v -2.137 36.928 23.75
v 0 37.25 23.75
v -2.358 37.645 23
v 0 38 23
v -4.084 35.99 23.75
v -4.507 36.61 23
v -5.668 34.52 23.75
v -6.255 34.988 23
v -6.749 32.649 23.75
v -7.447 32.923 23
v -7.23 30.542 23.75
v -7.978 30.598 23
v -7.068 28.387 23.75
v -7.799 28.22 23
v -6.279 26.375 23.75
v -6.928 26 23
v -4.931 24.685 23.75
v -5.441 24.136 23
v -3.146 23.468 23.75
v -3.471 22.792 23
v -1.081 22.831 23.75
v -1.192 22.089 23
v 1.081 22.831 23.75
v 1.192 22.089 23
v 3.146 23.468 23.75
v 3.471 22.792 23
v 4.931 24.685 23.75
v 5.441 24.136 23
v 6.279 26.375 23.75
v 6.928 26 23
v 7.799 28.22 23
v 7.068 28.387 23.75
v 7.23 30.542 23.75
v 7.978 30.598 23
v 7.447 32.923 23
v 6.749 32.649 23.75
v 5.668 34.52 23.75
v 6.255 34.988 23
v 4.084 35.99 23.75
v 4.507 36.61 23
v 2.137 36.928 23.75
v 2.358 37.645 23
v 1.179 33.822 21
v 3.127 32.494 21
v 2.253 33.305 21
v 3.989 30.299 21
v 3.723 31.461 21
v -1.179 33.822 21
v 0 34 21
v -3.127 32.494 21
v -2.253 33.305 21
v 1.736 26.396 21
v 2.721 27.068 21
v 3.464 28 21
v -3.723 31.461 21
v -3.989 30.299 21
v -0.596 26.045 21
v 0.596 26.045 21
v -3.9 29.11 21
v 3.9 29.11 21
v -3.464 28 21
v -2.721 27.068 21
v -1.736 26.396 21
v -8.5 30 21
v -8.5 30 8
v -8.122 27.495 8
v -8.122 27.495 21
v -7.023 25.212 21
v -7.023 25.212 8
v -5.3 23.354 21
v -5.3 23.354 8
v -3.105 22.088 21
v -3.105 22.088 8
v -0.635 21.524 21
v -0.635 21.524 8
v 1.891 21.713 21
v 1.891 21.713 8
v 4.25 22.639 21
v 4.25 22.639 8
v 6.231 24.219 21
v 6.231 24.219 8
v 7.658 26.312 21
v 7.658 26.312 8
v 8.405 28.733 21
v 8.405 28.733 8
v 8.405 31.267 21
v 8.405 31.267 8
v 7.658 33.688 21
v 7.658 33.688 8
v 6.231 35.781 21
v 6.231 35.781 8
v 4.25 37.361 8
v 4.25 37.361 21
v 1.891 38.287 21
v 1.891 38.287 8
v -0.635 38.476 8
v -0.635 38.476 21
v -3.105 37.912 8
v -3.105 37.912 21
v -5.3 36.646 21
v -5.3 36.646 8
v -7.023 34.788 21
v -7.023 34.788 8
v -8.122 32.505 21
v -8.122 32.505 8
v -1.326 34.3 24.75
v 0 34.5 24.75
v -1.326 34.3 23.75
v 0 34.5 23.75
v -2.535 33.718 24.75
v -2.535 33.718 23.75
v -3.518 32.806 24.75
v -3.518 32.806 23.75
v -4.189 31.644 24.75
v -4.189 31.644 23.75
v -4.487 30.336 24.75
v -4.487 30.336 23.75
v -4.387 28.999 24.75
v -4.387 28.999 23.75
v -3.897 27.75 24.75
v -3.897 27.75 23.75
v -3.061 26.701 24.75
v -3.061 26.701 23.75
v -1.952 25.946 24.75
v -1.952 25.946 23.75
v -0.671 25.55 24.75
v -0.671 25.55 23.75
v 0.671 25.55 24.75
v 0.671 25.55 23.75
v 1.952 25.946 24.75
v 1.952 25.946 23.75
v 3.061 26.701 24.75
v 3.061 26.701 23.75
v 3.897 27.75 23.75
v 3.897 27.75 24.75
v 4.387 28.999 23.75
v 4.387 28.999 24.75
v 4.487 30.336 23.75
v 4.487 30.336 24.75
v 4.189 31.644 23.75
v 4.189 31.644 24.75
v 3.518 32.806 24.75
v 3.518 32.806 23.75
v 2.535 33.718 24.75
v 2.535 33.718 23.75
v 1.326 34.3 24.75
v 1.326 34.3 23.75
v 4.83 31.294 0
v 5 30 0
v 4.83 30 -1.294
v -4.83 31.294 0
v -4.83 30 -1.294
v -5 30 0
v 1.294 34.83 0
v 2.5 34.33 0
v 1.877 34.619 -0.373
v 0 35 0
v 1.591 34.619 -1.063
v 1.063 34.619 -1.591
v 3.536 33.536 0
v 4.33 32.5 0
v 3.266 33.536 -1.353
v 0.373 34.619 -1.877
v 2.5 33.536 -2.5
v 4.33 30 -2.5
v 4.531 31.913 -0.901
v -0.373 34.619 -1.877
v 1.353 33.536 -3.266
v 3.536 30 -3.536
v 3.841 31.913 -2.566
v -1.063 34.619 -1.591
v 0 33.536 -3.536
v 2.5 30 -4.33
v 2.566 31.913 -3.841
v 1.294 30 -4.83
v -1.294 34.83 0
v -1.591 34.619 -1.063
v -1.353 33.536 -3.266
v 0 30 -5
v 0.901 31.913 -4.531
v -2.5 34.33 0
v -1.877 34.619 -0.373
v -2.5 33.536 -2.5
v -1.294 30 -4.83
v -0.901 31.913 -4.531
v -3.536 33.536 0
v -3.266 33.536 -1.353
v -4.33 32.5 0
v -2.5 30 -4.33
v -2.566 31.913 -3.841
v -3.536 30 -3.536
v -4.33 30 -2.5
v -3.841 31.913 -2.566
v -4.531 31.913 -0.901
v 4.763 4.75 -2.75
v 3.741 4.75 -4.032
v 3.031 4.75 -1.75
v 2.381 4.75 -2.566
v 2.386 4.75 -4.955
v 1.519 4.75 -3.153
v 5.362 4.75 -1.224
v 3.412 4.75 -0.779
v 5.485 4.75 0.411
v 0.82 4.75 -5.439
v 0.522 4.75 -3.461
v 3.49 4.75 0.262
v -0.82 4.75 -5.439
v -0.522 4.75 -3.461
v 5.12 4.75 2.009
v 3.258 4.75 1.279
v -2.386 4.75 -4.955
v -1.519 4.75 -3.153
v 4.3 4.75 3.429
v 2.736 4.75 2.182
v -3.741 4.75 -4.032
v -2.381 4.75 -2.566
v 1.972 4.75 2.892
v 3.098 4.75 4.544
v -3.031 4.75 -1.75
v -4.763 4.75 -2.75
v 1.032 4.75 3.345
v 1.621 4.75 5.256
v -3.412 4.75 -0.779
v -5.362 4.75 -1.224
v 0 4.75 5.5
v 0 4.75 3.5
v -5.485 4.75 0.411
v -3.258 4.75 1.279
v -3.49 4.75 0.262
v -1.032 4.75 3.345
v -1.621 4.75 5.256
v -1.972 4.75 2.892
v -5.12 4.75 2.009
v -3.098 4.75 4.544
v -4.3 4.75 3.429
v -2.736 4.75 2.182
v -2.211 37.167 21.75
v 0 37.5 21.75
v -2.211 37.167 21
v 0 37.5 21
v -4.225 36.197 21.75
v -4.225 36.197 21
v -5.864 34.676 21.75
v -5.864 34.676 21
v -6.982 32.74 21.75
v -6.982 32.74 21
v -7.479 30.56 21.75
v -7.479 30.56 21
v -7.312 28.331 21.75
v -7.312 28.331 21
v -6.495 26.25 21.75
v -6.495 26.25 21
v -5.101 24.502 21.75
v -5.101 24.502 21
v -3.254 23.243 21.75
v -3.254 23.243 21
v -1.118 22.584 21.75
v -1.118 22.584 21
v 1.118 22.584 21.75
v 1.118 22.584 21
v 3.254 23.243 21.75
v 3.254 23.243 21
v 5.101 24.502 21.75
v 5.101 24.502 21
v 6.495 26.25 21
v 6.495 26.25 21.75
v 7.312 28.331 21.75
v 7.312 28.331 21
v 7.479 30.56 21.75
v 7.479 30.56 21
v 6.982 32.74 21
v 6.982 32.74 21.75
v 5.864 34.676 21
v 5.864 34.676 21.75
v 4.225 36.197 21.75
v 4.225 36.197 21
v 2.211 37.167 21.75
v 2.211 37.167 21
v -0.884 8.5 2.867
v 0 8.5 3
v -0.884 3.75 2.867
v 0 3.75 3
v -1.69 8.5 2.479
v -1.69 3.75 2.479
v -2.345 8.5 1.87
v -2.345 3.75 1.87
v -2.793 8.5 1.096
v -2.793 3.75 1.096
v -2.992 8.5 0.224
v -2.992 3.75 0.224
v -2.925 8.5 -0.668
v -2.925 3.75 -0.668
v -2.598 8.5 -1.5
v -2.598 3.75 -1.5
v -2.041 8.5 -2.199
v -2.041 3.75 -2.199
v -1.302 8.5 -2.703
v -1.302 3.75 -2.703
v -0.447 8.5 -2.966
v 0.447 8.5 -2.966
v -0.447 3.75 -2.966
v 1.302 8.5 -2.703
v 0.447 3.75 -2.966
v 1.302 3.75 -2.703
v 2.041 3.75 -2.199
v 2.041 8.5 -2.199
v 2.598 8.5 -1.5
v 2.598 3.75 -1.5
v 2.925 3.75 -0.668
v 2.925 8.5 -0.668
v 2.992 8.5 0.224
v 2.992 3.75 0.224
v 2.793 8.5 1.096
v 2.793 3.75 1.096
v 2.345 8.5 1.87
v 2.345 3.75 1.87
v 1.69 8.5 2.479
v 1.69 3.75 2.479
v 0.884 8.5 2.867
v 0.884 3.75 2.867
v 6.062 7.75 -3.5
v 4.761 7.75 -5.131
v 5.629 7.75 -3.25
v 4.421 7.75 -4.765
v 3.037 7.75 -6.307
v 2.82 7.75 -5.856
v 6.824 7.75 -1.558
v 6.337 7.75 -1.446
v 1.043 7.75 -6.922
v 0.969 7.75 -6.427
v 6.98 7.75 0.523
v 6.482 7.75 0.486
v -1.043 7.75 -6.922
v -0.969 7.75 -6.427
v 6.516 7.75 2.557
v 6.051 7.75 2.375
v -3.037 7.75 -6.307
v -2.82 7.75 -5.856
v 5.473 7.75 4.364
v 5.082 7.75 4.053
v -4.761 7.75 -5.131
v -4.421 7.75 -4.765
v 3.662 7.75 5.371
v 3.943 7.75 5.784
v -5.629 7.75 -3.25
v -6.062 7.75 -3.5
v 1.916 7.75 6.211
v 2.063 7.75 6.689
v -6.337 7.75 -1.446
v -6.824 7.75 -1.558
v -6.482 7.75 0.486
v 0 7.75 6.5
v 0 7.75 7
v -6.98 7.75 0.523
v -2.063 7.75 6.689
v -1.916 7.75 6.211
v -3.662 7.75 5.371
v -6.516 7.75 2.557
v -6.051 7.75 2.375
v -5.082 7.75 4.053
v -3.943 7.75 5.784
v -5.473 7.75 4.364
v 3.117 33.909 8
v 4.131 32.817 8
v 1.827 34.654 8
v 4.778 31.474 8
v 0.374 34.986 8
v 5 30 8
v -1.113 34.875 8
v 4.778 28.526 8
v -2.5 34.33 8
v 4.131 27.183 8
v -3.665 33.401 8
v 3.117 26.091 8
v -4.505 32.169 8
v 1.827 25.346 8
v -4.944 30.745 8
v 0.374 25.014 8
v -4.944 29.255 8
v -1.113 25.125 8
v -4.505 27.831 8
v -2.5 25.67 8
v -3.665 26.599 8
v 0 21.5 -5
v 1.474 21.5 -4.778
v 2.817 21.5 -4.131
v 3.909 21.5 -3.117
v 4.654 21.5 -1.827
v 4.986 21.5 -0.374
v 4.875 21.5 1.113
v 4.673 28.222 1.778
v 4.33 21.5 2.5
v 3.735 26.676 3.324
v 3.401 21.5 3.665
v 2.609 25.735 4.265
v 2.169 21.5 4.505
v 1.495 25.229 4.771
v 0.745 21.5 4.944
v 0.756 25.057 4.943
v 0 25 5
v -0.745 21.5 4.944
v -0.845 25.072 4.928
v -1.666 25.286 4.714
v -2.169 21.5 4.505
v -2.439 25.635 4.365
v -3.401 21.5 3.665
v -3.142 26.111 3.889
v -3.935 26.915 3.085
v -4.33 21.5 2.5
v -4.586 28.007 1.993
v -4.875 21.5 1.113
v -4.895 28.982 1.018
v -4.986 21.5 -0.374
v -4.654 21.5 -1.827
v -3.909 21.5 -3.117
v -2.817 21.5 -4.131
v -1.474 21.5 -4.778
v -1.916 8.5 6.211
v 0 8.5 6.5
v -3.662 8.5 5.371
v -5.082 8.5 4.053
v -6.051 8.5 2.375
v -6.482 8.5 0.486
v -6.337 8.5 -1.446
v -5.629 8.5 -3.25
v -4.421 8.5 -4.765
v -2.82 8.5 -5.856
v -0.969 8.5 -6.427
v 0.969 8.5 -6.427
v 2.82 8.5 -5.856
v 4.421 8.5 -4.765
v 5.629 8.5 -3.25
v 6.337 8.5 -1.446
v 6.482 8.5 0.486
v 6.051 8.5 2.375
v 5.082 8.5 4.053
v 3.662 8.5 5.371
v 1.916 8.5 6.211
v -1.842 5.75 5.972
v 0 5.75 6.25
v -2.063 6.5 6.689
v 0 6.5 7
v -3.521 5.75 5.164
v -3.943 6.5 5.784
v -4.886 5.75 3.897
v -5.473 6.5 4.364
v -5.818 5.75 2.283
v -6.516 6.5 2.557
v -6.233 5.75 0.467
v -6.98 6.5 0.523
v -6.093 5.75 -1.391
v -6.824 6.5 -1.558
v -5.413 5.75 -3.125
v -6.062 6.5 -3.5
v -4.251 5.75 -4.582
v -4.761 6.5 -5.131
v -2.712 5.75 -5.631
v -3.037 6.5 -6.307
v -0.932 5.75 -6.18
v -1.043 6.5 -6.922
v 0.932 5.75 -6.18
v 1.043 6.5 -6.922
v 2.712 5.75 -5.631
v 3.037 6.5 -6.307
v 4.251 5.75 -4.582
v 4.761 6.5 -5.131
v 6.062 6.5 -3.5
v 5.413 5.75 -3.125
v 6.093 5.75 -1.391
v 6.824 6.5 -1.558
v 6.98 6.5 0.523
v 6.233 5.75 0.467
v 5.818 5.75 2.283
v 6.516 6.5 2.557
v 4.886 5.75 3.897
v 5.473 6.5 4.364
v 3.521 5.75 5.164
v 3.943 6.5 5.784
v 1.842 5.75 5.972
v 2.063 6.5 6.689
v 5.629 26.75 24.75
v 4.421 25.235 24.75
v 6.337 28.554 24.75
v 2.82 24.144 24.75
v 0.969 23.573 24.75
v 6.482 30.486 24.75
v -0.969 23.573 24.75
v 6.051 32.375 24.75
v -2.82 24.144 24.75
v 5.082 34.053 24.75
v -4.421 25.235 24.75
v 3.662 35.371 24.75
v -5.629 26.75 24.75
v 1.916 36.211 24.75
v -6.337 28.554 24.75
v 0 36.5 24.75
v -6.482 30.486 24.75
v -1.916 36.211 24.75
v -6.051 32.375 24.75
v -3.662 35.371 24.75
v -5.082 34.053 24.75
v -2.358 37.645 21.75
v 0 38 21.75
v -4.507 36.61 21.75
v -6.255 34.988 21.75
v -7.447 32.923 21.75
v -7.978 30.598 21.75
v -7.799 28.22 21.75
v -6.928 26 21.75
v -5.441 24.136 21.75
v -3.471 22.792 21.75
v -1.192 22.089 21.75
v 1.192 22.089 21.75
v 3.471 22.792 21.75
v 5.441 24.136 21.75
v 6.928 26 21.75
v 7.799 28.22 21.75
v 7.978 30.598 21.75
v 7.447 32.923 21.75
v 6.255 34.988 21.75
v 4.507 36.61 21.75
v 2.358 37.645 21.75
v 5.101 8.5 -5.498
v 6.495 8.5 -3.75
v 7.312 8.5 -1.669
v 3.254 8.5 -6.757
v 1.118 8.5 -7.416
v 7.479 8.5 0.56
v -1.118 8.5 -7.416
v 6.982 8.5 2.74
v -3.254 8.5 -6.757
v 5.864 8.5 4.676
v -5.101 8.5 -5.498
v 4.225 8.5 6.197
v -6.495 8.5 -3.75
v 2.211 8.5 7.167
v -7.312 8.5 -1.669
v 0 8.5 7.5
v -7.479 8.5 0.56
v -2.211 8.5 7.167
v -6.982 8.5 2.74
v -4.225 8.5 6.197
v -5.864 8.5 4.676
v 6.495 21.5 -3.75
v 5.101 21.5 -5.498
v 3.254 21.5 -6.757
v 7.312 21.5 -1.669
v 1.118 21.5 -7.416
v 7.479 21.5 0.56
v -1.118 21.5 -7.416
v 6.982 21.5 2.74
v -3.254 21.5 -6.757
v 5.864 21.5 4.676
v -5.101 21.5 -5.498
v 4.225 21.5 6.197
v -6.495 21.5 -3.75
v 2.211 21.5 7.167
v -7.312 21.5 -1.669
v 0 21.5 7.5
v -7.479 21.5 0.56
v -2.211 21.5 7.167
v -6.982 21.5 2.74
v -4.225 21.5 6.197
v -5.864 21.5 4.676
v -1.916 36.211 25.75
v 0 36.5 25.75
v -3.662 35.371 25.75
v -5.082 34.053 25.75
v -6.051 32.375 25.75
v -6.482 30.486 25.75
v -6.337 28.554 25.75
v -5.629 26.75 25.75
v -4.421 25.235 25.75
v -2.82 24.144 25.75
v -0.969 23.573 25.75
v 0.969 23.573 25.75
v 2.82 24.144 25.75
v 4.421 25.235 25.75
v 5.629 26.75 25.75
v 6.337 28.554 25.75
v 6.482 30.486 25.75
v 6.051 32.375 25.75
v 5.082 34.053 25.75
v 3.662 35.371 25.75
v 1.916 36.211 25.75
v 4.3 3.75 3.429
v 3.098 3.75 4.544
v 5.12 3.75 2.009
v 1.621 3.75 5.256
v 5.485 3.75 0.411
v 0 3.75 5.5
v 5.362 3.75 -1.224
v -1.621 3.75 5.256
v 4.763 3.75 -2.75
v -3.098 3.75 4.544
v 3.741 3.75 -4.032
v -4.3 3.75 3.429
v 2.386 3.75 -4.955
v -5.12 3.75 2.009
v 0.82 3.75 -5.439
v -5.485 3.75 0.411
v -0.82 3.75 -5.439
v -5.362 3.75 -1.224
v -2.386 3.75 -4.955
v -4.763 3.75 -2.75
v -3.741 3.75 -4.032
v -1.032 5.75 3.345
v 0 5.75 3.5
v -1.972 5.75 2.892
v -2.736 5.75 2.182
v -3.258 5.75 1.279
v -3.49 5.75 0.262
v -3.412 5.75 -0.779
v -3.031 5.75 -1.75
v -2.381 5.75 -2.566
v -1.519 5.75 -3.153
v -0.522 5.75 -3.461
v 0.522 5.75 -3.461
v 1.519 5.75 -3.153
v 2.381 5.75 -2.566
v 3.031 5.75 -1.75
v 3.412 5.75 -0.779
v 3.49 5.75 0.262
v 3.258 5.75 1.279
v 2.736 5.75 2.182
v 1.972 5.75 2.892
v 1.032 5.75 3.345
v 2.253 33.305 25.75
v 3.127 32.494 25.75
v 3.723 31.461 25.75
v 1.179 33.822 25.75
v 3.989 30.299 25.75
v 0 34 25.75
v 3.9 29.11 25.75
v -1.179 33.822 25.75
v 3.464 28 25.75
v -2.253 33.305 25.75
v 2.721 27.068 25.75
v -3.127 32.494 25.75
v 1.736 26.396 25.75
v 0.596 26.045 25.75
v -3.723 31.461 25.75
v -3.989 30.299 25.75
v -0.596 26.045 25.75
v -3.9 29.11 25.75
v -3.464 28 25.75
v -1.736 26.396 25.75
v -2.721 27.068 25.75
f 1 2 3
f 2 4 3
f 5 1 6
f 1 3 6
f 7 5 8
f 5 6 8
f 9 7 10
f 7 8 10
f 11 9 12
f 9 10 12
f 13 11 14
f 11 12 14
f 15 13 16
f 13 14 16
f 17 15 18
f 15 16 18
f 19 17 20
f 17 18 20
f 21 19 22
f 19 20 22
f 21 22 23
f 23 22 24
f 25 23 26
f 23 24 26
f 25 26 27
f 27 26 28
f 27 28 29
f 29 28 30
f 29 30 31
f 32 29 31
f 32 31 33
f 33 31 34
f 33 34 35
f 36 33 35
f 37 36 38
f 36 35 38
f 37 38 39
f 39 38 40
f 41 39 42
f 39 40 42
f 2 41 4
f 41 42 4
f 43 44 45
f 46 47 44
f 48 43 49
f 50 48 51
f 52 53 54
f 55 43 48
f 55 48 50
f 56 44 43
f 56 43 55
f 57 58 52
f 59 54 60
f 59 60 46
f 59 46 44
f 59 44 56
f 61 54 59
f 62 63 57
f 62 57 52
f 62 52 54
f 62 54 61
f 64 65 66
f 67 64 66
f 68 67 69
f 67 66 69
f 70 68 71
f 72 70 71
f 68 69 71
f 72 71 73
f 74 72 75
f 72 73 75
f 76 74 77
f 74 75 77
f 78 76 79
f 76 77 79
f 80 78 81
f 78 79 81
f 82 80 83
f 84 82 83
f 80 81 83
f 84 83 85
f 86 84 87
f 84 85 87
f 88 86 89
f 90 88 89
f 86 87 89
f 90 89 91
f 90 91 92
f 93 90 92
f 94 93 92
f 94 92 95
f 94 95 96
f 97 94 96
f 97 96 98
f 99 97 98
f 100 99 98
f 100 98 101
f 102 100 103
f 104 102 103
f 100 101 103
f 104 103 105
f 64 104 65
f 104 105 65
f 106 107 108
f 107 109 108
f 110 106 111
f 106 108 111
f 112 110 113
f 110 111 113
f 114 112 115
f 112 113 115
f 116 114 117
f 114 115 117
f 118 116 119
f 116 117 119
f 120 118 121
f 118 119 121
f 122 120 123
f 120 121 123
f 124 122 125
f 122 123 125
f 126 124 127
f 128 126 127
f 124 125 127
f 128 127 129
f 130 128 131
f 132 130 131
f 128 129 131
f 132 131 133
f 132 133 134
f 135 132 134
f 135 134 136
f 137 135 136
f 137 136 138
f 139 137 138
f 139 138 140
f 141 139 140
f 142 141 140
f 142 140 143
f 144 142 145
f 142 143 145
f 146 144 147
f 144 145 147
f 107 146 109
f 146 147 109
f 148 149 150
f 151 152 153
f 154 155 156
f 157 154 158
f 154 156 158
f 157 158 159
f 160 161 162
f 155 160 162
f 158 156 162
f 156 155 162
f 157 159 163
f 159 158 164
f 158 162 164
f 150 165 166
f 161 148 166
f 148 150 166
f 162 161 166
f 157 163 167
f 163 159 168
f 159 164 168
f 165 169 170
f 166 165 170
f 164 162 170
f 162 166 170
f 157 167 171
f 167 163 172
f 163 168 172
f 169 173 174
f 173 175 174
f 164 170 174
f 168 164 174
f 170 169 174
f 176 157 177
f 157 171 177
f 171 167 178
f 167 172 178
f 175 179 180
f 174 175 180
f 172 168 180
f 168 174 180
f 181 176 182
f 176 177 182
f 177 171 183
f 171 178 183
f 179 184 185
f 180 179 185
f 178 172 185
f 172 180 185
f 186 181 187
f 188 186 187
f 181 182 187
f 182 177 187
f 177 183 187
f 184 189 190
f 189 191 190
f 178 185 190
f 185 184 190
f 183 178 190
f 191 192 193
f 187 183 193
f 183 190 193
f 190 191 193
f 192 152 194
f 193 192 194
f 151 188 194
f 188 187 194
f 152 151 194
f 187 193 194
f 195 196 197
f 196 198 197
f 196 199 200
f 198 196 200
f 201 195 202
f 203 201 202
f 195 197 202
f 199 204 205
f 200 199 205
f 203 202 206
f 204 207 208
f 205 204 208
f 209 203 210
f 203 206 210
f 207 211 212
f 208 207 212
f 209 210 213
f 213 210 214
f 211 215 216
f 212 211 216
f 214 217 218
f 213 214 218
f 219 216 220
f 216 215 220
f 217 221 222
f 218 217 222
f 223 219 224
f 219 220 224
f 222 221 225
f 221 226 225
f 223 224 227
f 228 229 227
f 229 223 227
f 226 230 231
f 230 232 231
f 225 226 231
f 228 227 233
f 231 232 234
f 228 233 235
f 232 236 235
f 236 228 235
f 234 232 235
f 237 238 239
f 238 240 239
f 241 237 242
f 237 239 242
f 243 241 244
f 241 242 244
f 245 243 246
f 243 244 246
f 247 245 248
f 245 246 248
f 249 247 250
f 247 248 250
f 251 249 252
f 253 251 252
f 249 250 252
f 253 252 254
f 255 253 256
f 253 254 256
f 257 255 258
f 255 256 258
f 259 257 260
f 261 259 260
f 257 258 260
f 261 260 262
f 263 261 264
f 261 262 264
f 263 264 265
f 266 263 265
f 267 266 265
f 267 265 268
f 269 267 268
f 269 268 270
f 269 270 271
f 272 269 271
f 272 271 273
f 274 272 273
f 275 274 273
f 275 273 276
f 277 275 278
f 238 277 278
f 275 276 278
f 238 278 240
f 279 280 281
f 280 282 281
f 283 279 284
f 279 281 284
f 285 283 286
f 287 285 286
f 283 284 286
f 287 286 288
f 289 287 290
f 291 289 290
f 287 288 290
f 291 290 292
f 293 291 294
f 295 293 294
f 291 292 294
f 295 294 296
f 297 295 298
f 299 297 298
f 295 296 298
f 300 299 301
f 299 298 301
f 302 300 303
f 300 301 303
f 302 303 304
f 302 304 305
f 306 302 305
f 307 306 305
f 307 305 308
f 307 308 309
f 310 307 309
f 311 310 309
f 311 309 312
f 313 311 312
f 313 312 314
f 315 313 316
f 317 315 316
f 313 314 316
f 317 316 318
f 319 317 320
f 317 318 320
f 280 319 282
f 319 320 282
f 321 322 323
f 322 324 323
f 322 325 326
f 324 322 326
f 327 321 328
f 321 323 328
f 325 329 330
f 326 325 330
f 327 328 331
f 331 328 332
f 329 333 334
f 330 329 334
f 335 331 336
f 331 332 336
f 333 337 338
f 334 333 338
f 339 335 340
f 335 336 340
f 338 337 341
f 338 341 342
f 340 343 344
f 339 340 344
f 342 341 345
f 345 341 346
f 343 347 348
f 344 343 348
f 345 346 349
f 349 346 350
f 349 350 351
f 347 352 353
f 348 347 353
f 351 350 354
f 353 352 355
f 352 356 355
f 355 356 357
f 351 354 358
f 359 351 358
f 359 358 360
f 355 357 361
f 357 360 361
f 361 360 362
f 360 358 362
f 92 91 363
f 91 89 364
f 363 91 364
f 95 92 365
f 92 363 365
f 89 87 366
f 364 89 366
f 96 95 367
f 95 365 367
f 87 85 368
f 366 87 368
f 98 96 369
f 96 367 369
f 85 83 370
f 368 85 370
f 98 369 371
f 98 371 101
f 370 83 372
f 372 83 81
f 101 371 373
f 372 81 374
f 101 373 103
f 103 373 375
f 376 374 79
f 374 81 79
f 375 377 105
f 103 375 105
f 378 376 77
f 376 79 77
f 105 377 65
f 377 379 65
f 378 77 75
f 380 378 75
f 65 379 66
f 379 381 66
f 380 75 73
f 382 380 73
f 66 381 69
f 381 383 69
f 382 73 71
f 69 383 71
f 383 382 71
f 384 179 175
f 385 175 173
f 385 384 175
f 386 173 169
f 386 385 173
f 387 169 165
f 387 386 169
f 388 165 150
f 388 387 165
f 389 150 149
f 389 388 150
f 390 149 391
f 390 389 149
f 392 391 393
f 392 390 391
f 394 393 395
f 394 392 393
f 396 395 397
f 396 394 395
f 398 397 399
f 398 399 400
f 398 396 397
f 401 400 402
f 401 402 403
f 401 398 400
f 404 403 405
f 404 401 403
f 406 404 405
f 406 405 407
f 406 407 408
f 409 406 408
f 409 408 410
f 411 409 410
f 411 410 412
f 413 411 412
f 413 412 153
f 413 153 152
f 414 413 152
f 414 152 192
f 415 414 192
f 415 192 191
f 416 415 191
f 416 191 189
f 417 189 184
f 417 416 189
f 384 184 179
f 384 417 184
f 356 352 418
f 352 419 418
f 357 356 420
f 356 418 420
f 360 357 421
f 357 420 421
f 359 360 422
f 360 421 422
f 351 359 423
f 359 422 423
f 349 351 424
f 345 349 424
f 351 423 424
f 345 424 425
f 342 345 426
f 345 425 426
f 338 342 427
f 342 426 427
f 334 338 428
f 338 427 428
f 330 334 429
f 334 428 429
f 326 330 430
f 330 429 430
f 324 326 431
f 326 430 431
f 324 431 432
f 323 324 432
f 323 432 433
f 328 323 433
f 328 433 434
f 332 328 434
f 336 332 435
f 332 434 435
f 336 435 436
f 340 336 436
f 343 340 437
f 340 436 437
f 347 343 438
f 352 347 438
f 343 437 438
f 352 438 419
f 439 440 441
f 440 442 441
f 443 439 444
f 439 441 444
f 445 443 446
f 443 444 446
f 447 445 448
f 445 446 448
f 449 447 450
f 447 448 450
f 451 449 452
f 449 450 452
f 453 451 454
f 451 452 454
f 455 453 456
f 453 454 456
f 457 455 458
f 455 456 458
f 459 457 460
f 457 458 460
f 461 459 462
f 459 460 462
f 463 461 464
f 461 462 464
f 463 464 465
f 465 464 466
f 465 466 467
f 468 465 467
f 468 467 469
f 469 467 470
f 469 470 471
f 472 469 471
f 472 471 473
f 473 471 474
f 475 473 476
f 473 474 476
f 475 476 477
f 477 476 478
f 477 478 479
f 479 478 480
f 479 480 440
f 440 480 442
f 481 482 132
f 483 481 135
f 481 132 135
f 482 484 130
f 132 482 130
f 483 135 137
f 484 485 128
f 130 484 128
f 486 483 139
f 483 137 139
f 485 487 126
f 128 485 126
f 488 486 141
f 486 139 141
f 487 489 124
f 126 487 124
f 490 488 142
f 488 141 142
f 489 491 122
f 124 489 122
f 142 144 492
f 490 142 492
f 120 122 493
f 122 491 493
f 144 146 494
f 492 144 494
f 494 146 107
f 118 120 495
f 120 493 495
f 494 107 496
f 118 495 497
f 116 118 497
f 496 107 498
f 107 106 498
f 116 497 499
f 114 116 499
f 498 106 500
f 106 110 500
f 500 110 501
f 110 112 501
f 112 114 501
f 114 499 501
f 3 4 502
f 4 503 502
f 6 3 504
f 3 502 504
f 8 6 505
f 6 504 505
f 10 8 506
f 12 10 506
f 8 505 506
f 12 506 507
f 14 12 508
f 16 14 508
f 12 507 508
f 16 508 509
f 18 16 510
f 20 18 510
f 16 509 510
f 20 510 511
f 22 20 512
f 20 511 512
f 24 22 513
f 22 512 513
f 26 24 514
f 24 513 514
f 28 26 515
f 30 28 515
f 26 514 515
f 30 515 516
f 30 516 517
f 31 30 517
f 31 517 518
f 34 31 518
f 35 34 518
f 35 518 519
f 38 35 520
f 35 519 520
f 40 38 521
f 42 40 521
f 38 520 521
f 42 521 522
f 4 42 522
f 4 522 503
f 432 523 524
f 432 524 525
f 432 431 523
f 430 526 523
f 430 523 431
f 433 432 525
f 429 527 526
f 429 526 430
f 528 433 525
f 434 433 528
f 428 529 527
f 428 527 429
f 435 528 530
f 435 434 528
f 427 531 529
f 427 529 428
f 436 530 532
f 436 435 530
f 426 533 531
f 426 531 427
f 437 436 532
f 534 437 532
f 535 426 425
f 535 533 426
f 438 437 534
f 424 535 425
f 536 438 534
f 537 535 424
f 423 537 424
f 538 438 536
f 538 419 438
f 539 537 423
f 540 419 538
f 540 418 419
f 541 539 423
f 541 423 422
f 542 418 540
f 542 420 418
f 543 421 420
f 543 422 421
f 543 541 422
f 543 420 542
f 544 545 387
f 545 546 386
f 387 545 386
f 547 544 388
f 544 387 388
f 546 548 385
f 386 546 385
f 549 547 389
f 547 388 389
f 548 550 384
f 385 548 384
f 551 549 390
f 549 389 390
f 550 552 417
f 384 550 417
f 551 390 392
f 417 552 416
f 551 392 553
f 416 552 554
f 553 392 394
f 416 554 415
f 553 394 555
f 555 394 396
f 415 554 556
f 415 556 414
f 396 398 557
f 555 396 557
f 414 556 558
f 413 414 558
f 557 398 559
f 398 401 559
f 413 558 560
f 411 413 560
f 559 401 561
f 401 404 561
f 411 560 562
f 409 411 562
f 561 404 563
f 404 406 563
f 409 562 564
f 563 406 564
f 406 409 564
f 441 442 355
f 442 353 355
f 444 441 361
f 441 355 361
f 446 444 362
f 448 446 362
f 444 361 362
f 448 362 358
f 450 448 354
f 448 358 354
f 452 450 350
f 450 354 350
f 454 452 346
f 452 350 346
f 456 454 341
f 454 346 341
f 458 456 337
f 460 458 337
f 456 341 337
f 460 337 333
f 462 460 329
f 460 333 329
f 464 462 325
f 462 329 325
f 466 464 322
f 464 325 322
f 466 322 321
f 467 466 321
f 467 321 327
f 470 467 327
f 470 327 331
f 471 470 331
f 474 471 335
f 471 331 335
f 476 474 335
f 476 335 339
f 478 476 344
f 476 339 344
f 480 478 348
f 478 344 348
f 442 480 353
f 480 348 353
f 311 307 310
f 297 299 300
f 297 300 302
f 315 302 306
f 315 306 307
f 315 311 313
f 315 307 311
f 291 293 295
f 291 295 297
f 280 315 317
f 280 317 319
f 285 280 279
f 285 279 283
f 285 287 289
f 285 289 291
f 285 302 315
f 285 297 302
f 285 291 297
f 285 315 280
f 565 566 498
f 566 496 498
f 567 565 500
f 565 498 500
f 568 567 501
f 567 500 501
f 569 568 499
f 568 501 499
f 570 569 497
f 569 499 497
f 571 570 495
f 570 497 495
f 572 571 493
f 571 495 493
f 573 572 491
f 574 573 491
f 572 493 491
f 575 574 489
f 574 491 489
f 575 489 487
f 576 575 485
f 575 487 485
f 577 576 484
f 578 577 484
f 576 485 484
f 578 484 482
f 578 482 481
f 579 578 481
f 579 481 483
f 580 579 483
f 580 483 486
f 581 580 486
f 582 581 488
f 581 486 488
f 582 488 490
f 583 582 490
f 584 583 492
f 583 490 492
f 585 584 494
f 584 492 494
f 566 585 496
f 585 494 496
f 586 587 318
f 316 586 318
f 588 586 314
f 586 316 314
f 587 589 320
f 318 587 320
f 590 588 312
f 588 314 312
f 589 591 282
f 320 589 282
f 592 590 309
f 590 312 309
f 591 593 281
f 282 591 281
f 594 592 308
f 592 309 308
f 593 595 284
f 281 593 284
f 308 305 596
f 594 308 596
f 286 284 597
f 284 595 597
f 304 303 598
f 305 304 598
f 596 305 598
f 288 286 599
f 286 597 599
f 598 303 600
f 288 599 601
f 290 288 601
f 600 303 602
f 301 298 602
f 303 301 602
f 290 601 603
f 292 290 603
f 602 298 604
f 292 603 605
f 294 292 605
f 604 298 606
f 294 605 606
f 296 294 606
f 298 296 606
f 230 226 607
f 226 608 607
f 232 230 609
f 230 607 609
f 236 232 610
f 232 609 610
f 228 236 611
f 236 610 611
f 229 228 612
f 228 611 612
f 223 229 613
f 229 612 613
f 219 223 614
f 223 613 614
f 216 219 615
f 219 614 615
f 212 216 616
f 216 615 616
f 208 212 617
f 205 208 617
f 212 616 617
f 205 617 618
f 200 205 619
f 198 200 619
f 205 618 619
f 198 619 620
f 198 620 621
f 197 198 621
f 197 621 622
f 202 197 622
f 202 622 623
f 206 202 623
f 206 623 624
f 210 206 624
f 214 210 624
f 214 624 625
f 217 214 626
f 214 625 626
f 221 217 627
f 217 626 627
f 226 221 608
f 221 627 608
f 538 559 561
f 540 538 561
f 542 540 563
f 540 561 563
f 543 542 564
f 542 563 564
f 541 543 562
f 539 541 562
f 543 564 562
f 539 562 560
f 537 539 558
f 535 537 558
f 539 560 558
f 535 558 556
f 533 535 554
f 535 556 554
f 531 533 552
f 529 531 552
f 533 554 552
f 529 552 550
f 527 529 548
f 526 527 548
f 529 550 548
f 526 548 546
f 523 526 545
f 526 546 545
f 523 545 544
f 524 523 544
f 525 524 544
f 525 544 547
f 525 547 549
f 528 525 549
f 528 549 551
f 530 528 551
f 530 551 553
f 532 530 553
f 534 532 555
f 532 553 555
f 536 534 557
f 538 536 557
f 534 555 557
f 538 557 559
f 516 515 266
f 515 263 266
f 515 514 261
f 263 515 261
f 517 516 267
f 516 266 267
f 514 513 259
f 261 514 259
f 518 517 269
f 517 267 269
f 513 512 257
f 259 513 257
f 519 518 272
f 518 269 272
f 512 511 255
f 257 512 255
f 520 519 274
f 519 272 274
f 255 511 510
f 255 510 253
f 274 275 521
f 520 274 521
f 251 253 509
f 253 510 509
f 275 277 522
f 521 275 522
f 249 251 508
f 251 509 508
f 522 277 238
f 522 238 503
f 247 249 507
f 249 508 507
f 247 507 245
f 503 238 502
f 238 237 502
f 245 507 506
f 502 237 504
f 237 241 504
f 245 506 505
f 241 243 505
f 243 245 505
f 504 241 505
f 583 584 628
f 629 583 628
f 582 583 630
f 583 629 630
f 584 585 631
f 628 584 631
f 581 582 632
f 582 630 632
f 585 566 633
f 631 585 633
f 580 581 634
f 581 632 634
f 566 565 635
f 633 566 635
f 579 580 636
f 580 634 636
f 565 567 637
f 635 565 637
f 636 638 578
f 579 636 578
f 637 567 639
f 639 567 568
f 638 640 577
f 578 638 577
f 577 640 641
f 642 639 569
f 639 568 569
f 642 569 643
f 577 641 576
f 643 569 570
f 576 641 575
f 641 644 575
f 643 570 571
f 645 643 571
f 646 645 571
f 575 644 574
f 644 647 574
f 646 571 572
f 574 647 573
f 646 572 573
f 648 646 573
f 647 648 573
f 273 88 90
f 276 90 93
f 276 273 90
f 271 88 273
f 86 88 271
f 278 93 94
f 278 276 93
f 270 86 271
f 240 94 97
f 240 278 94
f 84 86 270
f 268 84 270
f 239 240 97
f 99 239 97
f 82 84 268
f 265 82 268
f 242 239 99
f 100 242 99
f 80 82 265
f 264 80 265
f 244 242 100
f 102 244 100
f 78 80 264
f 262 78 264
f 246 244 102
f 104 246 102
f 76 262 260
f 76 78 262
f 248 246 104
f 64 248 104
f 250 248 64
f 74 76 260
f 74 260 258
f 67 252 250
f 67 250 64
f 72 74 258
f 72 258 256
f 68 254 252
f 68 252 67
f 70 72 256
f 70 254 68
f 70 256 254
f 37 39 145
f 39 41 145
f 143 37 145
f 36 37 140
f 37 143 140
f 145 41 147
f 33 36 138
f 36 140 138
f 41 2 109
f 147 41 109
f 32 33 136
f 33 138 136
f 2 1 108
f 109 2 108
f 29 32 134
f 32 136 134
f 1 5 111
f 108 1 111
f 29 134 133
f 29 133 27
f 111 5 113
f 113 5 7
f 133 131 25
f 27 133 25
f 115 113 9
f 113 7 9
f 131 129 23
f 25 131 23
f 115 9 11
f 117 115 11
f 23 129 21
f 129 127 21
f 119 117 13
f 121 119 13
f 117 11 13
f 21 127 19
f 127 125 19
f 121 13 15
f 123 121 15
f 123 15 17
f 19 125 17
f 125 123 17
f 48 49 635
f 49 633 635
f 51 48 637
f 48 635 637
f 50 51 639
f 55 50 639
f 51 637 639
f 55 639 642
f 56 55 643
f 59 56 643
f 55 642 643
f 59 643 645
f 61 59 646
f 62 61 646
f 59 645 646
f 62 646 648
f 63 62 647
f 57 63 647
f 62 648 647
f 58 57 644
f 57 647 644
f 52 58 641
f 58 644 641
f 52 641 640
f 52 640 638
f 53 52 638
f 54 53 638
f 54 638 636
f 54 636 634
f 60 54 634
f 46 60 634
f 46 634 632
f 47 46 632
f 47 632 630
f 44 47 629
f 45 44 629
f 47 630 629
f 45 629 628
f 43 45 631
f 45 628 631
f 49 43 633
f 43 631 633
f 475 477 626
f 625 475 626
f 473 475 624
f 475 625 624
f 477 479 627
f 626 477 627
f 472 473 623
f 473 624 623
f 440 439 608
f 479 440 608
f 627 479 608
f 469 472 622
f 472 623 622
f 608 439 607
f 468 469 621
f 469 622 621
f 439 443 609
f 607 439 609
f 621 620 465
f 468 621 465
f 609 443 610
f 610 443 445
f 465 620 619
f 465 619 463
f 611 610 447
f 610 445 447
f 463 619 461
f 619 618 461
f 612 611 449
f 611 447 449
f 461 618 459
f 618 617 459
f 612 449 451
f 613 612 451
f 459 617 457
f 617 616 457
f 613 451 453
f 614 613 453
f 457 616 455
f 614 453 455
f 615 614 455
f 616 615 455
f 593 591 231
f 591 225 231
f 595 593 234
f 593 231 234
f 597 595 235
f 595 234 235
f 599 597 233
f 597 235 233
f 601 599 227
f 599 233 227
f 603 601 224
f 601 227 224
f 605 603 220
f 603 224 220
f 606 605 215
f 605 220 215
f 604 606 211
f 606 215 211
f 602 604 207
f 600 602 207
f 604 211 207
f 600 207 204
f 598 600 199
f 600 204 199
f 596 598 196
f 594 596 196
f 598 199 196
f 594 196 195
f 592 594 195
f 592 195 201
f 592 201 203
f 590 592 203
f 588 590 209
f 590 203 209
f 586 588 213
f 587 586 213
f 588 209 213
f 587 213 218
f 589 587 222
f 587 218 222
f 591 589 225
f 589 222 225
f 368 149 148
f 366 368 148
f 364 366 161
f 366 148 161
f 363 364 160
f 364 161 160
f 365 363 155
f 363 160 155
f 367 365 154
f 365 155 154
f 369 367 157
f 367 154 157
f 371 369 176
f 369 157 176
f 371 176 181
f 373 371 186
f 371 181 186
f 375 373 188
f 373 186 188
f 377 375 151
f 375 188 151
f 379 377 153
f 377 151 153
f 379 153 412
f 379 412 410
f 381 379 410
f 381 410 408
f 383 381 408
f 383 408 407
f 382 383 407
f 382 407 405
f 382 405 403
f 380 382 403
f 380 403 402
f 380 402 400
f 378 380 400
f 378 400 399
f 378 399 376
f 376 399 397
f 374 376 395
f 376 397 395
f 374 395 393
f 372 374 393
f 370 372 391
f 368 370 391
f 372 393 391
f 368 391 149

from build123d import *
from build123d.topology import SkipClean

# Parameters (mm, degrees)
SKETCH_3_R      = 5
EXTRUDE_2_DEPTH = 8
SKETCH_4_R      = 8.5
EXTRUDE_3_DEPTH = 13
EXTRUDE_START   = 3.5
SKETCH_7_R      = 5
EXTRUDE_4_DEPTH = 3.5
SKETCH_8_R      = 7.5
EXTRUDE_6_DEPTH = 13


with BuildPart() as part:
    # Эскиз2 → Повернуть1 (revolve)
    with BuildSketch(Plane.XY, mode=Mode.PRIVATE) as revolve_1_sk:
        with BuildLine():
            Line((0, 25), (0, 35))
            ThreePointArc((0, 35), (3.535533906, 33.535533906), (5, 30))
            Line((5, 30), (5, 25))
            Line((5, 25), (0, 25))
        make_face()
    revolve(revolve_1_sk.sketch.rotate(Axis((0, 25, 0), (0, 1, 0)), 90), axis=Axis((0, 25, 0), (0, 1, 0)))

    # Эскиз3 → Бобышка-Вытянуть2 (add)
    with SkipClean():  # the faces are left unmerged after this step: merging them gives an invalid solid
        with BuildSketch(Plane.XY):
            with Locations((0, 30)):
                Circle(SKETCH_3_R)
        extrude(amount=EXTRUDE_2_DEPTH)

    # Эскиз4 → Бобышка-Вытянуть3 (add)
    with SkipClean():  # the faces are left unmerged after this step: merging them gives an invalid solid
        with BuildSketch(Plane.XY.offset(8)):
            with Locations(Location((0, 30, 0), (0, 0, 180))):
                Circle(SKETCH_4_R)
        extrude(amount=EXTRUDE_3_DEPTH)

    # Эскиз7 → Бобышка-Вытянуть4 (add)
    with BuildSketch(Plane.XZ.offset(-25).offset(EXTRUDE_START)):
        with Locations(Location((0, 0, 0), (0, 0, 270))):
            Circle(SKETCH_7_R)
    extrude(amount=-EXTRUDE_4_DEPTH)

    # Эскиз8 → Бобышка-Вытянуть6 (add)
    with BuildSketch(Plane.XZ.offset(-21.5)):
        with Locations(Location((0, 0, 0), (0, 0, 90))):
            Circle(SKETCH_8_R)
    extrude(amount=EXTRUDE_6_DEPTH)

    # Эскиз9 → Повернуть5 (revolve)
    with BuildSketch(Plane(origin=(0, 0, 0), x_dir=(0, 0, -1), z_dir=(1, 0, 0)), mode=Mode.PRIVATE) as revolve_5_sk:
        Polygon((5.5, 4.75), (3.5, 4.75), (3.5, 5.75), (6.25, 5.75), (7, 6.5), (7, 7.75), (6.5, 7.75), (6.5, 8.5), (3, 8.5), (3, 3.75), (5.5, 3.75), align=None)
    revolve(revolve_5_sk.sketch.rotate(Axis((0, 8.5, 0), (0, -1, 0)), 180), axis=Axis((0, 8.5, 0), (0, -1, 0)))

    # Эскиз5 → Повернуть6 (revolve)
    with BuildSketch(Plane(origin=(0, 0, 0), x_dir=(0, 0, -1), z_dir=(1, 0, 0)), mode=Mode.PRIVATE) as revolve_6_sk:
        Polygon((-24.75, 23.5), (-24.75, 25.5), (-23.75, 25.5), (-23.75, 22.75), (-23, 22), (-21.75, 22), (-21.75, 22.5), (-21, 22.5), (-21, 26), (-25.75, 26), (-25.75, 23.5), align=None)
    revolve(revolve_6_sk.sketch.rotate(Axis((0, 30, 21), (0, 0, 1)), 180), axis=Axis((0, 30, 21), (0, 0, 1)))


solid = part.part
